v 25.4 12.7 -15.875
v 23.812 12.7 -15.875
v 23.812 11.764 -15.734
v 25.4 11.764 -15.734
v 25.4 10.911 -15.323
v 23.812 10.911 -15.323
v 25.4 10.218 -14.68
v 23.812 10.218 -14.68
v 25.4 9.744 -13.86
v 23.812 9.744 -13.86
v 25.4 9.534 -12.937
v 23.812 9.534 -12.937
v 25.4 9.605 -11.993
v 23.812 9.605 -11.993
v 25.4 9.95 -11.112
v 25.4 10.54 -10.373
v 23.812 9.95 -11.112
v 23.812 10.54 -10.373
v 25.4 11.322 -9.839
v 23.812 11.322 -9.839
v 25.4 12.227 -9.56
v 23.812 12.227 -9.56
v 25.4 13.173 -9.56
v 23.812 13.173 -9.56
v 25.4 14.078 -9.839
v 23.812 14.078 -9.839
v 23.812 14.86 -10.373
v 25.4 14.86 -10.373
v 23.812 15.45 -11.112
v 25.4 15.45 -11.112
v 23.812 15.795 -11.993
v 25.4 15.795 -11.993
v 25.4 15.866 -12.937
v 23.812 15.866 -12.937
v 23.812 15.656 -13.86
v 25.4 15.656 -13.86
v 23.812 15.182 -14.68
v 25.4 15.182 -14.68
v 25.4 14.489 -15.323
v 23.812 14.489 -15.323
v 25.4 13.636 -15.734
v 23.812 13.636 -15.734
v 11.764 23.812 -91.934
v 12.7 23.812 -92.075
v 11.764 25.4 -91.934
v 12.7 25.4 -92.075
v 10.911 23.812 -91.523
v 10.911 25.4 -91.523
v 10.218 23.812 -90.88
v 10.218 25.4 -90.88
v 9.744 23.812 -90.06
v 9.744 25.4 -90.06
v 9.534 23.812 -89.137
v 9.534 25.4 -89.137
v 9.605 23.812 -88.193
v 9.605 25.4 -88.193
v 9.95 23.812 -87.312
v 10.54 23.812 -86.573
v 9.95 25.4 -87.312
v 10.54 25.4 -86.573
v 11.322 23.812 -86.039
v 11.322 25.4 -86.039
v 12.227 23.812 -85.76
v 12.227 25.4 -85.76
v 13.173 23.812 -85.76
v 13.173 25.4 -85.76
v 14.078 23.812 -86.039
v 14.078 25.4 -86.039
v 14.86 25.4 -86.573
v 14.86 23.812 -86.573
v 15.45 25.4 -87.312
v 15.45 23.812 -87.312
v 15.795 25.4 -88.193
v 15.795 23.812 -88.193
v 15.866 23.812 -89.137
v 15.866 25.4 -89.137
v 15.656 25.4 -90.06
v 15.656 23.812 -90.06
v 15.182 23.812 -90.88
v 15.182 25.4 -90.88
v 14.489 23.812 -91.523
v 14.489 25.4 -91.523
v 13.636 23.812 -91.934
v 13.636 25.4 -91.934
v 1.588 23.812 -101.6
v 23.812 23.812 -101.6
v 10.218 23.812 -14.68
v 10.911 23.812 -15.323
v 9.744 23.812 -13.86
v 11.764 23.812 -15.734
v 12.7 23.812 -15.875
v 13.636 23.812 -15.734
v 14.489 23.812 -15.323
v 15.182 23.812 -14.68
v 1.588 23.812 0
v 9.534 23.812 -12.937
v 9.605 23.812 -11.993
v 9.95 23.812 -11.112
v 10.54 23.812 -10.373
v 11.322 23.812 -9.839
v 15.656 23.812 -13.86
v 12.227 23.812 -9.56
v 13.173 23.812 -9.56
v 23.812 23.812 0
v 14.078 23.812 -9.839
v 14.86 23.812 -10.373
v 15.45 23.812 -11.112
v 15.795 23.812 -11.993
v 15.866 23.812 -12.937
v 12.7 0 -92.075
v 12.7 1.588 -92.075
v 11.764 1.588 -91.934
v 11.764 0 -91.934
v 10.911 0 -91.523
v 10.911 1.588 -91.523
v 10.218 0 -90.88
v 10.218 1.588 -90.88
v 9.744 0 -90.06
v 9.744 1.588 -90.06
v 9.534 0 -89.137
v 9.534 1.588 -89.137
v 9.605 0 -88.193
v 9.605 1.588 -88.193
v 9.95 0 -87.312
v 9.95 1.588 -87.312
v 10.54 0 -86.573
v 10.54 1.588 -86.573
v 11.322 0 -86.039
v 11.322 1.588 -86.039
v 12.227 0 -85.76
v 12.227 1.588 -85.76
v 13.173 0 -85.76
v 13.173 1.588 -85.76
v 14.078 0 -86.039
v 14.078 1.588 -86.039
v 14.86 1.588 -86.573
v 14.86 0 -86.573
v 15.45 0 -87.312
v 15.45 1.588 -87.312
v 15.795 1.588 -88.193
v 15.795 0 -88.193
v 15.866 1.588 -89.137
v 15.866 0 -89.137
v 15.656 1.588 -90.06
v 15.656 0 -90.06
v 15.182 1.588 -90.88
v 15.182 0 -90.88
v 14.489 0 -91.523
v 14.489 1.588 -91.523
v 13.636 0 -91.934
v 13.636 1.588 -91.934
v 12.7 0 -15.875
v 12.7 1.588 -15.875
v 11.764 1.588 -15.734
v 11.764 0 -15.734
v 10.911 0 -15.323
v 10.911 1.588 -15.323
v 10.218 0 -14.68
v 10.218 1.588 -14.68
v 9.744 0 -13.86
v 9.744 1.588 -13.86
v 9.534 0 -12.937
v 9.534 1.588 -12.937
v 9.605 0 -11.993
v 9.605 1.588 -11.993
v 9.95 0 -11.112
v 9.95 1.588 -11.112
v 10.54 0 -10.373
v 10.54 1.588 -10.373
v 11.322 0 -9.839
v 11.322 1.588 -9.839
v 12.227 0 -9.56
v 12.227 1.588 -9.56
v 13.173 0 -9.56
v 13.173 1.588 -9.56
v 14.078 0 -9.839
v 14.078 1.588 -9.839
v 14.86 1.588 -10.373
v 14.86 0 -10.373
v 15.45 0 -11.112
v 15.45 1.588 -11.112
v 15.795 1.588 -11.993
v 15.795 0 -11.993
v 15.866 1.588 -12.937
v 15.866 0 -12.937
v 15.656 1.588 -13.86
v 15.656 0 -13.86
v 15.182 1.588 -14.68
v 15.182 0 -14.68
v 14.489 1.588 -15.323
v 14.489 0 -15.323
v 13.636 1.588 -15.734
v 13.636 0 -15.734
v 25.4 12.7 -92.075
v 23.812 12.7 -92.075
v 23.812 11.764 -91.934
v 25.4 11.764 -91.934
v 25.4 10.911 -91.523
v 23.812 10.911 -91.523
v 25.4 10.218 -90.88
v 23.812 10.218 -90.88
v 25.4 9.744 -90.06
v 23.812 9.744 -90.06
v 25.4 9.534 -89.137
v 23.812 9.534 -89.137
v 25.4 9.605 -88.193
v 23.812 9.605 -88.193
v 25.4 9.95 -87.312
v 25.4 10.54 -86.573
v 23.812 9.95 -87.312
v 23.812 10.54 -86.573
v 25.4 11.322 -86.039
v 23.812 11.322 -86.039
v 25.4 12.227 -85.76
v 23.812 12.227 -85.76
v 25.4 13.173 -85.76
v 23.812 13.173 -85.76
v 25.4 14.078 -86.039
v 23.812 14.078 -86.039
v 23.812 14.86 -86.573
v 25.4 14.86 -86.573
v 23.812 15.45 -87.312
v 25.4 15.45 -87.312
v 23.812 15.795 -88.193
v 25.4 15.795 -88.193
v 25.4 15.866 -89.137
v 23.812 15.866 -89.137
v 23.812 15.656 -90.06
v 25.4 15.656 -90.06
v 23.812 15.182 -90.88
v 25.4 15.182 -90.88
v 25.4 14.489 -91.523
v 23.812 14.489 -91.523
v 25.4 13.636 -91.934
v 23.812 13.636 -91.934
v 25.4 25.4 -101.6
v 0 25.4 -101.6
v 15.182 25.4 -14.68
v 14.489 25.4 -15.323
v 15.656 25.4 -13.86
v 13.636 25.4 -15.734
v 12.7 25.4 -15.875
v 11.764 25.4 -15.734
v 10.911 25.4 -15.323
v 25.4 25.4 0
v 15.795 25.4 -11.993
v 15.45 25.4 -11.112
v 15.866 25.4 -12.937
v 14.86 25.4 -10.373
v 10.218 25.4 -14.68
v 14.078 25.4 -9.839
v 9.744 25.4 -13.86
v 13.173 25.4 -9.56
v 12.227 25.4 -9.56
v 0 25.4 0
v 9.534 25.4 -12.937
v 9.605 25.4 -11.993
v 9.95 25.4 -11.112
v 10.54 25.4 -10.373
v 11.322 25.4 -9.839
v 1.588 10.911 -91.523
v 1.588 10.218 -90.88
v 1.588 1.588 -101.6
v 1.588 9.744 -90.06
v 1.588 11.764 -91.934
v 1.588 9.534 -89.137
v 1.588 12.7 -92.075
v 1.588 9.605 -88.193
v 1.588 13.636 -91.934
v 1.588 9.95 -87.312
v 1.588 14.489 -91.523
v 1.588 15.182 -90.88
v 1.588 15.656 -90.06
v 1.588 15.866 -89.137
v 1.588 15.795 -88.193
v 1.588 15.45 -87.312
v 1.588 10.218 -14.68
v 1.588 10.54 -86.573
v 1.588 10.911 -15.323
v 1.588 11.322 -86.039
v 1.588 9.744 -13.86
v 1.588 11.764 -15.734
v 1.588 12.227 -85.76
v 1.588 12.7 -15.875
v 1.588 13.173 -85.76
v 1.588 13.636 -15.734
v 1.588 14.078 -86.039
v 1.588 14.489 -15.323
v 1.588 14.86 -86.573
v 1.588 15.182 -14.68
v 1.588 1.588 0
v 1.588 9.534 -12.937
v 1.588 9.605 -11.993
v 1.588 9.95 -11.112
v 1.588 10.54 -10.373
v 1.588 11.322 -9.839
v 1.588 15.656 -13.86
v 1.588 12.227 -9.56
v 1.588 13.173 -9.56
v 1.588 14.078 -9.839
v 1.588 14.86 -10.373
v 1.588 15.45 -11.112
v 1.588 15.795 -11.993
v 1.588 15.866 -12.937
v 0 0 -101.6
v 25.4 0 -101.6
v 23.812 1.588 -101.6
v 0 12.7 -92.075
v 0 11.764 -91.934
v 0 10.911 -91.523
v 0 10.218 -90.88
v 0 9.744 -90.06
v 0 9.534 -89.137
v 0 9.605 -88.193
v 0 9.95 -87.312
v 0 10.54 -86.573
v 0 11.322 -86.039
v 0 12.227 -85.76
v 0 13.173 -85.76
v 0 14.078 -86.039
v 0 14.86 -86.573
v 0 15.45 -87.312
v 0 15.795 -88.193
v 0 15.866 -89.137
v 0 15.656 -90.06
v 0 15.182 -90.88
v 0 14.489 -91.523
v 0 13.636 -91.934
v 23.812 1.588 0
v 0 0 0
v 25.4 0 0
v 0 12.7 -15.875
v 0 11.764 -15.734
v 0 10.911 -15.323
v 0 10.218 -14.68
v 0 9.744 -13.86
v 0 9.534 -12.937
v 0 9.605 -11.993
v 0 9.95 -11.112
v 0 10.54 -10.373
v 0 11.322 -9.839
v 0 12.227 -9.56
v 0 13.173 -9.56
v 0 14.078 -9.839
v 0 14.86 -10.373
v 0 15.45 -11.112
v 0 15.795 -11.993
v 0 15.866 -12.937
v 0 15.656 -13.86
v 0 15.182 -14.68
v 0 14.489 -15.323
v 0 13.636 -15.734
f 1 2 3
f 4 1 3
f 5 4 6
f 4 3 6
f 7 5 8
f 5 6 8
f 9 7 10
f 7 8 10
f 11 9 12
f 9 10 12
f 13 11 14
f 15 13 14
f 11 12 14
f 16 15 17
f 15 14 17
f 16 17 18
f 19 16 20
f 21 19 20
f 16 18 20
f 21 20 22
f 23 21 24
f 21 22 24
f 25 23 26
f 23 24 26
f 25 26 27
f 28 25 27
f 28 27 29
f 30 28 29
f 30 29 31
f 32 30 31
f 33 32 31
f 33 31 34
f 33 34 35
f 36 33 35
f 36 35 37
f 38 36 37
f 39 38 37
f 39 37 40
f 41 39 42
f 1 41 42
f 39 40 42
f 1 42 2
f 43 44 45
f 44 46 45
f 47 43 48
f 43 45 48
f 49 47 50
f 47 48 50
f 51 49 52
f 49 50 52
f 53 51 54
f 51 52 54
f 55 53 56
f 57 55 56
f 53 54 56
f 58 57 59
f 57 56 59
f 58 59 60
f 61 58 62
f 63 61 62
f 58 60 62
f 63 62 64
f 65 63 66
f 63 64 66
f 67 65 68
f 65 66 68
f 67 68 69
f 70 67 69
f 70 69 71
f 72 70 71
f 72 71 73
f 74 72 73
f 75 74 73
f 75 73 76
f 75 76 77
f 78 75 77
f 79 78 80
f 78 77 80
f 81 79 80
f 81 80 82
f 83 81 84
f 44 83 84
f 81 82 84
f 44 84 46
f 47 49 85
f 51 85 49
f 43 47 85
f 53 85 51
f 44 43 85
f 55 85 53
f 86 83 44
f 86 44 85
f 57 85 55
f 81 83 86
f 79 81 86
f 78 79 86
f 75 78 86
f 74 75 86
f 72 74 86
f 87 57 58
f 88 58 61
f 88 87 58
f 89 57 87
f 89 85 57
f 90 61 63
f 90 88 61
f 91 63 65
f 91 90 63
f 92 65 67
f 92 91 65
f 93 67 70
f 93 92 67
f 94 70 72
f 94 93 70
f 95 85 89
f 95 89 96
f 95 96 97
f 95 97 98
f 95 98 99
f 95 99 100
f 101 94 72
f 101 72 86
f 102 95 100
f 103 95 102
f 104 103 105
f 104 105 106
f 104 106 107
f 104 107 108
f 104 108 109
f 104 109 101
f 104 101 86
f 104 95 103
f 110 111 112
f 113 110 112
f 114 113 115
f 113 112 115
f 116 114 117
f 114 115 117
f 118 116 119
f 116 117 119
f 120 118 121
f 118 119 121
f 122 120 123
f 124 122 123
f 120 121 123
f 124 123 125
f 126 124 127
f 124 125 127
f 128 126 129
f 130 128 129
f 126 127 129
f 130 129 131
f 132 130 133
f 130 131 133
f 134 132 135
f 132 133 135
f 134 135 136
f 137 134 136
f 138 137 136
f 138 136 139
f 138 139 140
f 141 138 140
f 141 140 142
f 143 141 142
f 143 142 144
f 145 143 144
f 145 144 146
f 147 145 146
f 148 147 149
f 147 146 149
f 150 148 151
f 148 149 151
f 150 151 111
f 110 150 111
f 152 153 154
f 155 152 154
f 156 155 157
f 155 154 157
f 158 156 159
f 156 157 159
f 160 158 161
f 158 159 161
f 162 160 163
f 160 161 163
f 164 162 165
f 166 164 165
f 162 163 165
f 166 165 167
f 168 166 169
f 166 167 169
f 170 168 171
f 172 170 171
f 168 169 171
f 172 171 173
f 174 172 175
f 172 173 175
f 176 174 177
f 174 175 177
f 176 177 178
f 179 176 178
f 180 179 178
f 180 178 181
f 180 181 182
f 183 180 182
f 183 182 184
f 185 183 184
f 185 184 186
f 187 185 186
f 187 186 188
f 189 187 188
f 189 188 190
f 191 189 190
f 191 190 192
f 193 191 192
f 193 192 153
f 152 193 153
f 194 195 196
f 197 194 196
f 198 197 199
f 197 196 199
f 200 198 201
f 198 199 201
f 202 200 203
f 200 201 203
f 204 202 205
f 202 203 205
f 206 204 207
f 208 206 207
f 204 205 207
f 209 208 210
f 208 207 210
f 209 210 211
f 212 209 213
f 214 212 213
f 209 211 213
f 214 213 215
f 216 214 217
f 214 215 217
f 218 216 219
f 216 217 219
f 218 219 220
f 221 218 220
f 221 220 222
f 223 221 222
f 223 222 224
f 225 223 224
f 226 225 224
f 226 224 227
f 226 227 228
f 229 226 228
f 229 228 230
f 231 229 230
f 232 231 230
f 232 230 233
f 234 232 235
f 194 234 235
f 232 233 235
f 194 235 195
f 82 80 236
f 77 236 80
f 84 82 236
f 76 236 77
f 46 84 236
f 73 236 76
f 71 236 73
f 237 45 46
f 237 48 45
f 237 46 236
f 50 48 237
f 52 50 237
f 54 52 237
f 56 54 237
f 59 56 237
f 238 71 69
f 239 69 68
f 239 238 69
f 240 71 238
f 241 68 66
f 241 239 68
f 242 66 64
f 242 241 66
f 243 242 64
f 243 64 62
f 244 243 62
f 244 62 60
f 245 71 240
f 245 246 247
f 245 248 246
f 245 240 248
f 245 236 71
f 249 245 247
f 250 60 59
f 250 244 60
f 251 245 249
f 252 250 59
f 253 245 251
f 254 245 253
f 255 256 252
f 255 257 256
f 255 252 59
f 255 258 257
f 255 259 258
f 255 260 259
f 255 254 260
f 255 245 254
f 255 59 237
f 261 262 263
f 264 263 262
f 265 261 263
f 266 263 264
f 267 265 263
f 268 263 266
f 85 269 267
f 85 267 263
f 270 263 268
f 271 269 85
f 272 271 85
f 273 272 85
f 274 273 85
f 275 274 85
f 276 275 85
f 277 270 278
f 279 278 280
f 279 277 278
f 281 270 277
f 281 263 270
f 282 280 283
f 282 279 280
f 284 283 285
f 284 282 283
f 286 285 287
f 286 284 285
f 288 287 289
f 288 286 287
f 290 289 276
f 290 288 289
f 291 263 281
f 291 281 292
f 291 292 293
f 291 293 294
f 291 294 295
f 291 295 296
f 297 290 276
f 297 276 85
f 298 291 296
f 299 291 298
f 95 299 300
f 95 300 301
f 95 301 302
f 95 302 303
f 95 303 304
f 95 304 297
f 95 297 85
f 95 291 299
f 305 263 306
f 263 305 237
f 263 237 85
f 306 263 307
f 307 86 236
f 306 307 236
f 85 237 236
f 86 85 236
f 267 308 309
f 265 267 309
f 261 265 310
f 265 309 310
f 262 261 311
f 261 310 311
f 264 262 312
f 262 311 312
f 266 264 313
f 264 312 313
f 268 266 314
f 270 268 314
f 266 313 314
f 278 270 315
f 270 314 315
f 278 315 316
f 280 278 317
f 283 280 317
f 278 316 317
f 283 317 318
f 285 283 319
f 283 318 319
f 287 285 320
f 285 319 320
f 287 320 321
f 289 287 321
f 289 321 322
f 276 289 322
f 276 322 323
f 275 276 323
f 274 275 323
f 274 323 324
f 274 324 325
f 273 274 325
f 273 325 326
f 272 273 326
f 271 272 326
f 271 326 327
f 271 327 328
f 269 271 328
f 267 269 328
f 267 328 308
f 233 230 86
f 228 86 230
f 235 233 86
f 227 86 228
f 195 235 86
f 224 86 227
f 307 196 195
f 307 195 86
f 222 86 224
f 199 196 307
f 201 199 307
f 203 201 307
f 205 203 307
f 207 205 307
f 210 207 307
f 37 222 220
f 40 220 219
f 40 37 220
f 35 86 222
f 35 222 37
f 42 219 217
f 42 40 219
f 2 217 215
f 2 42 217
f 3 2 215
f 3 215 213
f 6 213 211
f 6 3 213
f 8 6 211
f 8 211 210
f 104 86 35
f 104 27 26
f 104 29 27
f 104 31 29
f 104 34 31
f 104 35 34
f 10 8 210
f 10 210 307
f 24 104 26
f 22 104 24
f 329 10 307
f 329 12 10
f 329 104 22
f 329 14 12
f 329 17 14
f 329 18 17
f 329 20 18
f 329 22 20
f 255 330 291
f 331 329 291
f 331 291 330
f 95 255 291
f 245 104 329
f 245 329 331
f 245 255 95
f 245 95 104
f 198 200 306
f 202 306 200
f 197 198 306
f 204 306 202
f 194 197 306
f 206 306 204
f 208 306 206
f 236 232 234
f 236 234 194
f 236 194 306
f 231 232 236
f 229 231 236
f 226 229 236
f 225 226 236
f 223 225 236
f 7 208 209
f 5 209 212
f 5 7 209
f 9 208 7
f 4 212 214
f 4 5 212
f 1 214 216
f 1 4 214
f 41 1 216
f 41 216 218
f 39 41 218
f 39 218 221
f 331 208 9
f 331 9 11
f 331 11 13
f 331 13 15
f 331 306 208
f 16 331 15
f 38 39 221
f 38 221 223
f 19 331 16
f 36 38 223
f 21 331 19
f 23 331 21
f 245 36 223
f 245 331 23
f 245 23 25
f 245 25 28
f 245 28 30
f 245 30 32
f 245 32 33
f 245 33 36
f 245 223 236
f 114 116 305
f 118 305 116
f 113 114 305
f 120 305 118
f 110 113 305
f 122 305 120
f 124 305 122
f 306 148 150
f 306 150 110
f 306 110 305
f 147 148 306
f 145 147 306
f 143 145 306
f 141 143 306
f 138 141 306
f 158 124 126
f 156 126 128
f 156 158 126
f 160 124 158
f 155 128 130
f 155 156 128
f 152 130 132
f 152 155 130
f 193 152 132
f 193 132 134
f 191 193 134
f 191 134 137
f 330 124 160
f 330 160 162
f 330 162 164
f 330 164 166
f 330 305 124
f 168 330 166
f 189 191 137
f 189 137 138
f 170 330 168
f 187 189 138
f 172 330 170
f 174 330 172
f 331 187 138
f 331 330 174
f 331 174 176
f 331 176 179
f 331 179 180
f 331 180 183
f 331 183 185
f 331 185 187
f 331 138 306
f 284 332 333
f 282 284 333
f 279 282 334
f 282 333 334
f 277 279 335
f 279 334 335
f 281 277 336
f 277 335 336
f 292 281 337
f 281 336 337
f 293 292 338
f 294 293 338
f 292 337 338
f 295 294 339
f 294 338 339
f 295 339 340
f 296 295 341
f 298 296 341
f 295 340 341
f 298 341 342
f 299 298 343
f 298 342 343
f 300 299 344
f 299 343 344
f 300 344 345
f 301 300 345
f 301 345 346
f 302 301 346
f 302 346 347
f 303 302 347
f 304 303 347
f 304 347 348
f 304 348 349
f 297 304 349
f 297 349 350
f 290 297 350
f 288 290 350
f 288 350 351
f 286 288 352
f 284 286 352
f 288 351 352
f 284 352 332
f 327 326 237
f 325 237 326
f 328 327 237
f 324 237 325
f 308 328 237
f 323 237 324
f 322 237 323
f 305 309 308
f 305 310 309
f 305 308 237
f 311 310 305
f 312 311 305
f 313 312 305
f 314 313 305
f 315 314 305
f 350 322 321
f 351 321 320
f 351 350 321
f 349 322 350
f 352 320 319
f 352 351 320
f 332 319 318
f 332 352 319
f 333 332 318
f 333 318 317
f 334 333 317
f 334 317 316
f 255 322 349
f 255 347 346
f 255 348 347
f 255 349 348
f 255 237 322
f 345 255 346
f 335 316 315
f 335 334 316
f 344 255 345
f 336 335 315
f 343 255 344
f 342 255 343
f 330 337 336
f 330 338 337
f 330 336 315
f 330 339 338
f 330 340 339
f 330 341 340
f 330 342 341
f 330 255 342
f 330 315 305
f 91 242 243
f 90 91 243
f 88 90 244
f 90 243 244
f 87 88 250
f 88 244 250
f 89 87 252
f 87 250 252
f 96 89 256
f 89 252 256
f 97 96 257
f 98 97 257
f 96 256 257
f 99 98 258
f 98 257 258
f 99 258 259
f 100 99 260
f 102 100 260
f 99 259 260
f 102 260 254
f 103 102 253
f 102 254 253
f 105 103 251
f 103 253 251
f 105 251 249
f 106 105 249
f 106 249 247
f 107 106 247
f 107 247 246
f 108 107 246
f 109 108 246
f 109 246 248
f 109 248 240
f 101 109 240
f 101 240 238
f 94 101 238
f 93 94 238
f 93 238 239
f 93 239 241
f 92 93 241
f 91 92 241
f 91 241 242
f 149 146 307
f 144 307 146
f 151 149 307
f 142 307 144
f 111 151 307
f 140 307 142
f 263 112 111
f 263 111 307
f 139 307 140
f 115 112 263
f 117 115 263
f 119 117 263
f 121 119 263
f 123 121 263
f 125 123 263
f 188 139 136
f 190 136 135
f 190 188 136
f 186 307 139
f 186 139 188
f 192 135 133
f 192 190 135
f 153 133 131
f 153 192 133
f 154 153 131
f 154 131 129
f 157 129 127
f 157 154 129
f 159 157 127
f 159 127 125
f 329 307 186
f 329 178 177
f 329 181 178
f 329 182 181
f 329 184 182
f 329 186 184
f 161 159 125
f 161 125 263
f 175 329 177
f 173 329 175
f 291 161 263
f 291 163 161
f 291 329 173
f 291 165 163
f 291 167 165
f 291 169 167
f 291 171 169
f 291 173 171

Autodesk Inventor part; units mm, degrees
ref_plane "YZ Plane" through (0, 0, 0) normal (1, 0, 0) x (0, 1, 0)
ref_plane "XZ Plane" through (0, 0, 0) normal (0, 1, 0) x (-1, 0, 0)
ref_plane "XY Plane" through (0, 0, 0) normal (0, 0, 1) x (1, 0, 0)
sketch "Sketch1" plane through (0, 0, 0) normal (0, 0, 1) x (1, 0, 0)
  line L0 (0, 0) -> (25.4, 0)
  line L1 (25.4, 0) -> (25.4, 25.4)
  line L2 (25.4, 25.4) -> (0, 25.4)
  line L3 (0, 25.4) -> (0, 0)
  line L4 (1.5875, 23.8125) -> (23.8125, 23.8125)
  line L5 (23.8125, 23.8125) -> (23.8125, 1.5875)
  line L6 (23.8125, 1.5875) -> (1.5875, 1.5875)
  line L7 (1.5875, 1.5875) -> (1.5875, 23.8125)
  dimension "d0" = 25.4
  dimension "d1" = 25.4
  dimension "d2" = 1.5875
extrude "Extrusion1" add sketch "Sketch1" against normal blind 101.6
sketch "Sketch2" plane through (25.4, 0, 0) normal (1, 0, 0) x (0, 0, -1)
  line L0 (101.6, 0) -> (101.6, 25.4) projected
  line L1 (0, 0) -> (0, 25.4) projected
  point P0 (12.7, 12.7)
  point P1 (88.9, 12.7)
  dimension "d5" = 12.7
  dimension "d6" = 12.7
sketch "Sketch3" plane through (0, 0, 0) normal (0, -1, 0) x (1, 0, 0)
  line L0 (0, -101.6) -> (25.4, -101.6) projected
  line L1 (0, 0) -> (25.4, 0) projected
  point P0 (12.7, -12.7)
  point P1 (12.7, -88.9)
  dimension "d7" = 12.7
  dimension "d8" = 12.7
hole "Hole1" at (25.4, 12.7, -12.7) at (25.4, 12.7, -88.9) direction (-1, 0, 0) diameter 6.35 depth 25.4 tip angle 118
hole "Hole2" at (12.7, 0, -12.7) at (12.7, 0, -88.9) direction (0, 1, 0) diameter 6.35 depth 25.4 tip angle 118
properties part number "1tube_4_layer1_outside"
